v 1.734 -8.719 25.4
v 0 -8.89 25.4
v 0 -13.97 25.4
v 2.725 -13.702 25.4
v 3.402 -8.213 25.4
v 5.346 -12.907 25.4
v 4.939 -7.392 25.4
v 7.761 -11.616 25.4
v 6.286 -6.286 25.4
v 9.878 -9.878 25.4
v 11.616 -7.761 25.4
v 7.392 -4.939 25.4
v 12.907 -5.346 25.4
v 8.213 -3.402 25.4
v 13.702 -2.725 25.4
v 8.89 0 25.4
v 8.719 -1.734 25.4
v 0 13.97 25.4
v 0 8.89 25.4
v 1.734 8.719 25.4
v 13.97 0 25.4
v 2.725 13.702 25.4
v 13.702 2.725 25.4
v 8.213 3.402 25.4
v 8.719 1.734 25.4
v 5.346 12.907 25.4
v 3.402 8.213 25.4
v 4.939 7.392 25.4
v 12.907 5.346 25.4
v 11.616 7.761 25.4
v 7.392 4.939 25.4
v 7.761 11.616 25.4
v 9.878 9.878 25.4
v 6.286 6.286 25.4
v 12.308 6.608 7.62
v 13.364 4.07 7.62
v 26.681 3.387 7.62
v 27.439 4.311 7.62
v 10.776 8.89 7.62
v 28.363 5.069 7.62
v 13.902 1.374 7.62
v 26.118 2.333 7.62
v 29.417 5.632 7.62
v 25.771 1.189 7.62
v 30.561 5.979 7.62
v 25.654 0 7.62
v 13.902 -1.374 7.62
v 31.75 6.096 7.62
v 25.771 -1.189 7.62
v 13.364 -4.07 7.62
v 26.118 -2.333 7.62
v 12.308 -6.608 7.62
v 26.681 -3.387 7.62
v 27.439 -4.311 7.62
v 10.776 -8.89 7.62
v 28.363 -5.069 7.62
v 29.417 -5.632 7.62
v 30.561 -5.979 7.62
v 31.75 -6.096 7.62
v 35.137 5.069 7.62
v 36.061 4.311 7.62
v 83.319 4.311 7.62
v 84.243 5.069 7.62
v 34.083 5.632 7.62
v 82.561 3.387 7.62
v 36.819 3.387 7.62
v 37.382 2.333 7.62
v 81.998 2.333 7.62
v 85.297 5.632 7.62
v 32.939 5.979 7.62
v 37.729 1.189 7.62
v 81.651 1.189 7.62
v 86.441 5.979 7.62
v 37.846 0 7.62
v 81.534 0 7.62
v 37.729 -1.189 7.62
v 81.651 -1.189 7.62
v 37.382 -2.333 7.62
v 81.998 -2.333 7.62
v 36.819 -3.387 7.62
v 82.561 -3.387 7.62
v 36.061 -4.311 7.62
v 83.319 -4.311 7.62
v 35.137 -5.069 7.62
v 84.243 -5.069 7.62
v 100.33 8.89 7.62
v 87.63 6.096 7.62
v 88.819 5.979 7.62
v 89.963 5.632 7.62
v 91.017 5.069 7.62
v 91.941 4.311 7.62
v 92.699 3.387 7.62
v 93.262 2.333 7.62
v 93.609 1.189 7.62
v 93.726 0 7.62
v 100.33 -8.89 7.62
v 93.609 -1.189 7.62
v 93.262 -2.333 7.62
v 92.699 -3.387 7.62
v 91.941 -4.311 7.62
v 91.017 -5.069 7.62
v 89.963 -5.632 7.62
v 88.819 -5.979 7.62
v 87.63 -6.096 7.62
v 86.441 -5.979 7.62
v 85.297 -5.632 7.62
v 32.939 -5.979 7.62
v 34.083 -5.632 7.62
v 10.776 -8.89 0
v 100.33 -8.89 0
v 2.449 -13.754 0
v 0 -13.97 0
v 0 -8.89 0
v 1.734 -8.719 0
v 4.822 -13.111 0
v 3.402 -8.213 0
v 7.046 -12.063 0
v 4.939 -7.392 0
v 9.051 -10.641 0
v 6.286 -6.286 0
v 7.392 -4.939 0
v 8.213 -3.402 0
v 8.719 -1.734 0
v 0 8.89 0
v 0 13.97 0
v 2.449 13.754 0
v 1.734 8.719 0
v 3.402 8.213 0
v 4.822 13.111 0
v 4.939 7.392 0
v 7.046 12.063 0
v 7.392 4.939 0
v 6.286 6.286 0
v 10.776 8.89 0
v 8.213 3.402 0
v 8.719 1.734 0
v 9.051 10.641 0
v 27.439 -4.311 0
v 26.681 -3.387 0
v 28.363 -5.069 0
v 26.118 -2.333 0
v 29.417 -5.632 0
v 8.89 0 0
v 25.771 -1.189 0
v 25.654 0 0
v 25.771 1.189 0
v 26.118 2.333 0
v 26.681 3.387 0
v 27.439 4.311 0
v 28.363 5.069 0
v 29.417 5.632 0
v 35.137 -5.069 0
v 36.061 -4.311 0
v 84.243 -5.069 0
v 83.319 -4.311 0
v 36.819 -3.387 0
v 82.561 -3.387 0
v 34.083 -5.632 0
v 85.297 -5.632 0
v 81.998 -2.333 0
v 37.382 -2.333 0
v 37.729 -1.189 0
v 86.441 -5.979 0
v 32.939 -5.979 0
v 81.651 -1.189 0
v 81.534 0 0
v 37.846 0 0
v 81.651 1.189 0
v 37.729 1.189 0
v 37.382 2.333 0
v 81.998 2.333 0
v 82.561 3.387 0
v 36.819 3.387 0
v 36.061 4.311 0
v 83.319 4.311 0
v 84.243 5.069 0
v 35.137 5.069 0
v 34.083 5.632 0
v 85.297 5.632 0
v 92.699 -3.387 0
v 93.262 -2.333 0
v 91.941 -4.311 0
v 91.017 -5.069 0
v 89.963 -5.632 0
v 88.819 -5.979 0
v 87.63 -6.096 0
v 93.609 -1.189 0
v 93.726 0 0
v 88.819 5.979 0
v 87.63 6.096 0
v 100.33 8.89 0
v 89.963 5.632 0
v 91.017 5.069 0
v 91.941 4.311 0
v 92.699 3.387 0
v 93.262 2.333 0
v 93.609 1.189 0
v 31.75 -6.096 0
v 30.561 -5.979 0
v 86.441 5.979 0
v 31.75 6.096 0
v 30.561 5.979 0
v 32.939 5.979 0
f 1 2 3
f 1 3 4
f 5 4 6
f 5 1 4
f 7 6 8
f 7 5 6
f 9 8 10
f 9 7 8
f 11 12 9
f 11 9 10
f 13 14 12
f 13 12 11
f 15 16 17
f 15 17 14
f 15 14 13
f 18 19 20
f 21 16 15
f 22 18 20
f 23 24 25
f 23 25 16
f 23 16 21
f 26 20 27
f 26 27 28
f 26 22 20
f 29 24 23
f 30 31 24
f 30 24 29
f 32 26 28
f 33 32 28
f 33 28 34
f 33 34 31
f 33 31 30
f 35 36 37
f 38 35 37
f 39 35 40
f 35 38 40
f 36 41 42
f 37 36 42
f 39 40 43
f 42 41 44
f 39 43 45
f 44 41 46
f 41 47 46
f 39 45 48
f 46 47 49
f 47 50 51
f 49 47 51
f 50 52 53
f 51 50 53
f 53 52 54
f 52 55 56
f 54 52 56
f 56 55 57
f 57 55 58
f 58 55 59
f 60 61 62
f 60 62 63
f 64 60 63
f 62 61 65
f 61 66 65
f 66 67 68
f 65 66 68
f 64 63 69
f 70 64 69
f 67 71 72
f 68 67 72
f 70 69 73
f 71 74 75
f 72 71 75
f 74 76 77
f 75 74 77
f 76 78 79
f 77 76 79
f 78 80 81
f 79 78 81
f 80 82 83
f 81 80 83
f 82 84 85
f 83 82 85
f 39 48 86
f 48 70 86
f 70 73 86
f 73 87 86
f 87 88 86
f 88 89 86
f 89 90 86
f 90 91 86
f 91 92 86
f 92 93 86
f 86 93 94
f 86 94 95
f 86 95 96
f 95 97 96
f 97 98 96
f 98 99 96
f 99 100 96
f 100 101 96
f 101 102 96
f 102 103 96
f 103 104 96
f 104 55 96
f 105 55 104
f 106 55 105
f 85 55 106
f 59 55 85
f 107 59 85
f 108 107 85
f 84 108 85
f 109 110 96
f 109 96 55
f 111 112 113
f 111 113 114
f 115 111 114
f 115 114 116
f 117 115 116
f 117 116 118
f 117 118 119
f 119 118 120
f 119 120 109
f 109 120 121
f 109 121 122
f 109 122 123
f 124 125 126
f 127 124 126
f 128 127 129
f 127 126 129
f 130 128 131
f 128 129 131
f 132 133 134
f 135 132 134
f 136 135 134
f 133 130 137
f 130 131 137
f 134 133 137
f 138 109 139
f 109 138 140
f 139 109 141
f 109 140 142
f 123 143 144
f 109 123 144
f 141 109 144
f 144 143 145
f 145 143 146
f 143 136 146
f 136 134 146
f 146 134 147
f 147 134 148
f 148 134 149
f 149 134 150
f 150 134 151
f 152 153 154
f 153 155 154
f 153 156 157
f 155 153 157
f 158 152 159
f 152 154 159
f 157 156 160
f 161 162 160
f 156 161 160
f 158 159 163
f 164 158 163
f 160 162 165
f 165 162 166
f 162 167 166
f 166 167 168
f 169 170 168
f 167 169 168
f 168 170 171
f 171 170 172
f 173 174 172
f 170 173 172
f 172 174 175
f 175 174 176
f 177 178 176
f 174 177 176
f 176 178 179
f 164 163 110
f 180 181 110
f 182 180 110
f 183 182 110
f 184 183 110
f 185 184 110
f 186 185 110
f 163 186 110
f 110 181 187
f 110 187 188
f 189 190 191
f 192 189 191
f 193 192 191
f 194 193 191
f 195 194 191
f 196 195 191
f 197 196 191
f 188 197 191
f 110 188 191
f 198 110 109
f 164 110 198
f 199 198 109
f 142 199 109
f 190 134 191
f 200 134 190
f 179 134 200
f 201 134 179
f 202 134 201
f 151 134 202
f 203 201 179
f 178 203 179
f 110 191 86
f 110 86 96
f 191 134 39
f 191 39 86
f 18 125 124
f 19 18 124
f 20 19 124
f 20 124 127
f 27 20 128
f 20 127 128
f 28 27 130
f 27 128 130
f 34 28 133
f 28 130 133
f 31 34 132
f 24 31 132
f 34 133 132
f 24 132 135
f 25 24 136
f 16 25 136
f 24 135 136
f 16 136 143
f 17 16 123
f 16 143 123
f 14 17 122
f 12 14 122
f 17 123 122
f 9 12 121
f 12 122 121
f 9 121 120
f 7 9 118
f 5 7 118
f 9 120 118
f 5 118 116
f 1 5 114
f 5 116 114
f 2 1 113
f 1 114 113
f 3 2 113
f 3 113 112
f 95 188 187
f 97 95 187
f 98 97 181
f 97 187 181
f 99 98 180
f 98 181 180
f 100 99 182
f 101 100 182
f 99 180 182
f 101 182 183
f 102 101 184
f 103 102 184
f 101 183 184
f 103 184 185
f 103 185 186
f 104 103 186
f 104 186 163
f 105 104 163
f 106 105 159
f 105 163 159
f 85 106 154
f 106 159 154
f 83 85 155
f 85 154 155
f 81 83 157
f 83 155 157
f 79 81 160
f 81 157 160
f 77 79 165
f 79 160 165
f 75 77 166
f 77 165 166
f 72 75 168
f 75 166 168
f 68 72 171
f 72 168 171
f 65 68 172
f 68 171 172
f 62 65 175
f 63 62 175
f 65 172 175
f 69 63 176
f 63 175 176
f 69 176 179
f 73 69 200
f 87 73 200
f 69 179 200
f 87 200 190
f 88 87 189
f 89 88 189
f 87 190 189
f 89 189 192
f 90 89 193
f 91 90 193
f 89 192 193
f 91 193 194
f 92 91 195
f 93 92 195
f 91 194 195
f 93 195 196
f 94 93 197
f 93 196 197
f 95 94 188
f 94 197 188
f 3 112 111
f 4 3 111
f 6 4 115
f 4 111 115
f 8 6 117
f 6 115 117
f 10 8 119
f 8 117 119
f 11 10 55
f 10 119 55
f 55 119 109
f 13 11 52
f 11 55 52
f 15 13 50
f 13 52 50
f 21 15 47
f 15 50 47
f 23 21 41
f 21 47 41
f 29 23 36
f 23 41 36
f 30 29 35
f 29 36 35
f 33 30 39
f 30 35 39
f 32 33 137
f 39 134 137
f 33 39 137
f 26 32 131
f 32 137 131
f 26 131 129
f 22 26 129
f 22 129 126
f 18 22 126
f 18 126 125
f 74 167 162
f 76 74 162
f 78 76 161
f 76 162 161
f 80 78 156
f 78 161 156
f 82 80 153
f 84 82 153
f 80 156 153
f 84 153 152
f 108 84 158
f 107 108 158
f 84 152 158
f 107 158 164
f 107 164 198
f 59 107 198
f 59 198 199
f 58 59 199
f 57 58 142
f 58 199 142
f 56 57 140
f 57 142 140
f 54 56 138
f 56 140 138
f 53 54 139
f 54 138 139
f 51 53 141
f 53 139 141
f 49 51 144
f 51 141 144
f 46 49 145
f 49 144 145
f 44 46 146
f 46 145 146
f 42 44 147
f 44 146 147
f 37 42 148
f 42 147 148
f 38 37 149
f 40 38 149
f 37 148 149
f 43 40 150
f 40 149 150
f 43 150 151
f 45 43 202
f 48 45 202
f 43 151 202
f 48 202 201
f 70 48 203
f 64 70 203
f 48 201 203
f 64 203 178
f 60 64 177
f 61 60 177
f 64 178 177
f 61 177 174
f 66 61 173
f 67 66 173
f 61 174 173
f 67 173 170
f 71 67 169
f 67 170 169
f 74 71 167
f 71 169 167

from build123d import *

# Parameters (mm, degrees)
F1_DEPTH = 25.4
F2_R     = 6.096
F3_DEPTH = 7.62


with BuildPart() as f1:
    # F0 (on Top) → F1 (new body)
    with BuildSketch(Plane.XY):
        with BuildLine():
            ThreePointArc((0, 8.89), (8.89, 0), (0, -8.89))
            Line((0, -8.89), (0, -13.97))
            ThreePointArc((0, -13.97), (13.97, 0), (0, 13.97))
            Line((0, 13.97), (0, 8.89))
        make_face()
    extrude(amount=F1_DEPTH)

    # F2 (on face) → F3 (join)
    with BuildSketch(Plane(origin=(0, 0, 0), x_dir=(1, 0, 0), z_dir=(0, 0, -1))):
        with BuildLine():
            Line((100.33, 8.89), (10.776307, 8.89))
            ThreePointArc((10.776307, 8.89), (13.97, 0), (10.776307, -8.89))
            Line((10.776307, -8.89), (100.33, -8.89))
            Line((100.33, -8.89), (100.33, 8.89))
        make_face()
        with Locations((31.75, 0)):
            Circle(F2_R, mode=Mode.SUBTRACT)
        with Locations((87.63, 0)):
            Circle(F2_R, mode=Mode.SUBTRACT)
    extrude(amount=-F3_DEPTH)


solid = f1.part
